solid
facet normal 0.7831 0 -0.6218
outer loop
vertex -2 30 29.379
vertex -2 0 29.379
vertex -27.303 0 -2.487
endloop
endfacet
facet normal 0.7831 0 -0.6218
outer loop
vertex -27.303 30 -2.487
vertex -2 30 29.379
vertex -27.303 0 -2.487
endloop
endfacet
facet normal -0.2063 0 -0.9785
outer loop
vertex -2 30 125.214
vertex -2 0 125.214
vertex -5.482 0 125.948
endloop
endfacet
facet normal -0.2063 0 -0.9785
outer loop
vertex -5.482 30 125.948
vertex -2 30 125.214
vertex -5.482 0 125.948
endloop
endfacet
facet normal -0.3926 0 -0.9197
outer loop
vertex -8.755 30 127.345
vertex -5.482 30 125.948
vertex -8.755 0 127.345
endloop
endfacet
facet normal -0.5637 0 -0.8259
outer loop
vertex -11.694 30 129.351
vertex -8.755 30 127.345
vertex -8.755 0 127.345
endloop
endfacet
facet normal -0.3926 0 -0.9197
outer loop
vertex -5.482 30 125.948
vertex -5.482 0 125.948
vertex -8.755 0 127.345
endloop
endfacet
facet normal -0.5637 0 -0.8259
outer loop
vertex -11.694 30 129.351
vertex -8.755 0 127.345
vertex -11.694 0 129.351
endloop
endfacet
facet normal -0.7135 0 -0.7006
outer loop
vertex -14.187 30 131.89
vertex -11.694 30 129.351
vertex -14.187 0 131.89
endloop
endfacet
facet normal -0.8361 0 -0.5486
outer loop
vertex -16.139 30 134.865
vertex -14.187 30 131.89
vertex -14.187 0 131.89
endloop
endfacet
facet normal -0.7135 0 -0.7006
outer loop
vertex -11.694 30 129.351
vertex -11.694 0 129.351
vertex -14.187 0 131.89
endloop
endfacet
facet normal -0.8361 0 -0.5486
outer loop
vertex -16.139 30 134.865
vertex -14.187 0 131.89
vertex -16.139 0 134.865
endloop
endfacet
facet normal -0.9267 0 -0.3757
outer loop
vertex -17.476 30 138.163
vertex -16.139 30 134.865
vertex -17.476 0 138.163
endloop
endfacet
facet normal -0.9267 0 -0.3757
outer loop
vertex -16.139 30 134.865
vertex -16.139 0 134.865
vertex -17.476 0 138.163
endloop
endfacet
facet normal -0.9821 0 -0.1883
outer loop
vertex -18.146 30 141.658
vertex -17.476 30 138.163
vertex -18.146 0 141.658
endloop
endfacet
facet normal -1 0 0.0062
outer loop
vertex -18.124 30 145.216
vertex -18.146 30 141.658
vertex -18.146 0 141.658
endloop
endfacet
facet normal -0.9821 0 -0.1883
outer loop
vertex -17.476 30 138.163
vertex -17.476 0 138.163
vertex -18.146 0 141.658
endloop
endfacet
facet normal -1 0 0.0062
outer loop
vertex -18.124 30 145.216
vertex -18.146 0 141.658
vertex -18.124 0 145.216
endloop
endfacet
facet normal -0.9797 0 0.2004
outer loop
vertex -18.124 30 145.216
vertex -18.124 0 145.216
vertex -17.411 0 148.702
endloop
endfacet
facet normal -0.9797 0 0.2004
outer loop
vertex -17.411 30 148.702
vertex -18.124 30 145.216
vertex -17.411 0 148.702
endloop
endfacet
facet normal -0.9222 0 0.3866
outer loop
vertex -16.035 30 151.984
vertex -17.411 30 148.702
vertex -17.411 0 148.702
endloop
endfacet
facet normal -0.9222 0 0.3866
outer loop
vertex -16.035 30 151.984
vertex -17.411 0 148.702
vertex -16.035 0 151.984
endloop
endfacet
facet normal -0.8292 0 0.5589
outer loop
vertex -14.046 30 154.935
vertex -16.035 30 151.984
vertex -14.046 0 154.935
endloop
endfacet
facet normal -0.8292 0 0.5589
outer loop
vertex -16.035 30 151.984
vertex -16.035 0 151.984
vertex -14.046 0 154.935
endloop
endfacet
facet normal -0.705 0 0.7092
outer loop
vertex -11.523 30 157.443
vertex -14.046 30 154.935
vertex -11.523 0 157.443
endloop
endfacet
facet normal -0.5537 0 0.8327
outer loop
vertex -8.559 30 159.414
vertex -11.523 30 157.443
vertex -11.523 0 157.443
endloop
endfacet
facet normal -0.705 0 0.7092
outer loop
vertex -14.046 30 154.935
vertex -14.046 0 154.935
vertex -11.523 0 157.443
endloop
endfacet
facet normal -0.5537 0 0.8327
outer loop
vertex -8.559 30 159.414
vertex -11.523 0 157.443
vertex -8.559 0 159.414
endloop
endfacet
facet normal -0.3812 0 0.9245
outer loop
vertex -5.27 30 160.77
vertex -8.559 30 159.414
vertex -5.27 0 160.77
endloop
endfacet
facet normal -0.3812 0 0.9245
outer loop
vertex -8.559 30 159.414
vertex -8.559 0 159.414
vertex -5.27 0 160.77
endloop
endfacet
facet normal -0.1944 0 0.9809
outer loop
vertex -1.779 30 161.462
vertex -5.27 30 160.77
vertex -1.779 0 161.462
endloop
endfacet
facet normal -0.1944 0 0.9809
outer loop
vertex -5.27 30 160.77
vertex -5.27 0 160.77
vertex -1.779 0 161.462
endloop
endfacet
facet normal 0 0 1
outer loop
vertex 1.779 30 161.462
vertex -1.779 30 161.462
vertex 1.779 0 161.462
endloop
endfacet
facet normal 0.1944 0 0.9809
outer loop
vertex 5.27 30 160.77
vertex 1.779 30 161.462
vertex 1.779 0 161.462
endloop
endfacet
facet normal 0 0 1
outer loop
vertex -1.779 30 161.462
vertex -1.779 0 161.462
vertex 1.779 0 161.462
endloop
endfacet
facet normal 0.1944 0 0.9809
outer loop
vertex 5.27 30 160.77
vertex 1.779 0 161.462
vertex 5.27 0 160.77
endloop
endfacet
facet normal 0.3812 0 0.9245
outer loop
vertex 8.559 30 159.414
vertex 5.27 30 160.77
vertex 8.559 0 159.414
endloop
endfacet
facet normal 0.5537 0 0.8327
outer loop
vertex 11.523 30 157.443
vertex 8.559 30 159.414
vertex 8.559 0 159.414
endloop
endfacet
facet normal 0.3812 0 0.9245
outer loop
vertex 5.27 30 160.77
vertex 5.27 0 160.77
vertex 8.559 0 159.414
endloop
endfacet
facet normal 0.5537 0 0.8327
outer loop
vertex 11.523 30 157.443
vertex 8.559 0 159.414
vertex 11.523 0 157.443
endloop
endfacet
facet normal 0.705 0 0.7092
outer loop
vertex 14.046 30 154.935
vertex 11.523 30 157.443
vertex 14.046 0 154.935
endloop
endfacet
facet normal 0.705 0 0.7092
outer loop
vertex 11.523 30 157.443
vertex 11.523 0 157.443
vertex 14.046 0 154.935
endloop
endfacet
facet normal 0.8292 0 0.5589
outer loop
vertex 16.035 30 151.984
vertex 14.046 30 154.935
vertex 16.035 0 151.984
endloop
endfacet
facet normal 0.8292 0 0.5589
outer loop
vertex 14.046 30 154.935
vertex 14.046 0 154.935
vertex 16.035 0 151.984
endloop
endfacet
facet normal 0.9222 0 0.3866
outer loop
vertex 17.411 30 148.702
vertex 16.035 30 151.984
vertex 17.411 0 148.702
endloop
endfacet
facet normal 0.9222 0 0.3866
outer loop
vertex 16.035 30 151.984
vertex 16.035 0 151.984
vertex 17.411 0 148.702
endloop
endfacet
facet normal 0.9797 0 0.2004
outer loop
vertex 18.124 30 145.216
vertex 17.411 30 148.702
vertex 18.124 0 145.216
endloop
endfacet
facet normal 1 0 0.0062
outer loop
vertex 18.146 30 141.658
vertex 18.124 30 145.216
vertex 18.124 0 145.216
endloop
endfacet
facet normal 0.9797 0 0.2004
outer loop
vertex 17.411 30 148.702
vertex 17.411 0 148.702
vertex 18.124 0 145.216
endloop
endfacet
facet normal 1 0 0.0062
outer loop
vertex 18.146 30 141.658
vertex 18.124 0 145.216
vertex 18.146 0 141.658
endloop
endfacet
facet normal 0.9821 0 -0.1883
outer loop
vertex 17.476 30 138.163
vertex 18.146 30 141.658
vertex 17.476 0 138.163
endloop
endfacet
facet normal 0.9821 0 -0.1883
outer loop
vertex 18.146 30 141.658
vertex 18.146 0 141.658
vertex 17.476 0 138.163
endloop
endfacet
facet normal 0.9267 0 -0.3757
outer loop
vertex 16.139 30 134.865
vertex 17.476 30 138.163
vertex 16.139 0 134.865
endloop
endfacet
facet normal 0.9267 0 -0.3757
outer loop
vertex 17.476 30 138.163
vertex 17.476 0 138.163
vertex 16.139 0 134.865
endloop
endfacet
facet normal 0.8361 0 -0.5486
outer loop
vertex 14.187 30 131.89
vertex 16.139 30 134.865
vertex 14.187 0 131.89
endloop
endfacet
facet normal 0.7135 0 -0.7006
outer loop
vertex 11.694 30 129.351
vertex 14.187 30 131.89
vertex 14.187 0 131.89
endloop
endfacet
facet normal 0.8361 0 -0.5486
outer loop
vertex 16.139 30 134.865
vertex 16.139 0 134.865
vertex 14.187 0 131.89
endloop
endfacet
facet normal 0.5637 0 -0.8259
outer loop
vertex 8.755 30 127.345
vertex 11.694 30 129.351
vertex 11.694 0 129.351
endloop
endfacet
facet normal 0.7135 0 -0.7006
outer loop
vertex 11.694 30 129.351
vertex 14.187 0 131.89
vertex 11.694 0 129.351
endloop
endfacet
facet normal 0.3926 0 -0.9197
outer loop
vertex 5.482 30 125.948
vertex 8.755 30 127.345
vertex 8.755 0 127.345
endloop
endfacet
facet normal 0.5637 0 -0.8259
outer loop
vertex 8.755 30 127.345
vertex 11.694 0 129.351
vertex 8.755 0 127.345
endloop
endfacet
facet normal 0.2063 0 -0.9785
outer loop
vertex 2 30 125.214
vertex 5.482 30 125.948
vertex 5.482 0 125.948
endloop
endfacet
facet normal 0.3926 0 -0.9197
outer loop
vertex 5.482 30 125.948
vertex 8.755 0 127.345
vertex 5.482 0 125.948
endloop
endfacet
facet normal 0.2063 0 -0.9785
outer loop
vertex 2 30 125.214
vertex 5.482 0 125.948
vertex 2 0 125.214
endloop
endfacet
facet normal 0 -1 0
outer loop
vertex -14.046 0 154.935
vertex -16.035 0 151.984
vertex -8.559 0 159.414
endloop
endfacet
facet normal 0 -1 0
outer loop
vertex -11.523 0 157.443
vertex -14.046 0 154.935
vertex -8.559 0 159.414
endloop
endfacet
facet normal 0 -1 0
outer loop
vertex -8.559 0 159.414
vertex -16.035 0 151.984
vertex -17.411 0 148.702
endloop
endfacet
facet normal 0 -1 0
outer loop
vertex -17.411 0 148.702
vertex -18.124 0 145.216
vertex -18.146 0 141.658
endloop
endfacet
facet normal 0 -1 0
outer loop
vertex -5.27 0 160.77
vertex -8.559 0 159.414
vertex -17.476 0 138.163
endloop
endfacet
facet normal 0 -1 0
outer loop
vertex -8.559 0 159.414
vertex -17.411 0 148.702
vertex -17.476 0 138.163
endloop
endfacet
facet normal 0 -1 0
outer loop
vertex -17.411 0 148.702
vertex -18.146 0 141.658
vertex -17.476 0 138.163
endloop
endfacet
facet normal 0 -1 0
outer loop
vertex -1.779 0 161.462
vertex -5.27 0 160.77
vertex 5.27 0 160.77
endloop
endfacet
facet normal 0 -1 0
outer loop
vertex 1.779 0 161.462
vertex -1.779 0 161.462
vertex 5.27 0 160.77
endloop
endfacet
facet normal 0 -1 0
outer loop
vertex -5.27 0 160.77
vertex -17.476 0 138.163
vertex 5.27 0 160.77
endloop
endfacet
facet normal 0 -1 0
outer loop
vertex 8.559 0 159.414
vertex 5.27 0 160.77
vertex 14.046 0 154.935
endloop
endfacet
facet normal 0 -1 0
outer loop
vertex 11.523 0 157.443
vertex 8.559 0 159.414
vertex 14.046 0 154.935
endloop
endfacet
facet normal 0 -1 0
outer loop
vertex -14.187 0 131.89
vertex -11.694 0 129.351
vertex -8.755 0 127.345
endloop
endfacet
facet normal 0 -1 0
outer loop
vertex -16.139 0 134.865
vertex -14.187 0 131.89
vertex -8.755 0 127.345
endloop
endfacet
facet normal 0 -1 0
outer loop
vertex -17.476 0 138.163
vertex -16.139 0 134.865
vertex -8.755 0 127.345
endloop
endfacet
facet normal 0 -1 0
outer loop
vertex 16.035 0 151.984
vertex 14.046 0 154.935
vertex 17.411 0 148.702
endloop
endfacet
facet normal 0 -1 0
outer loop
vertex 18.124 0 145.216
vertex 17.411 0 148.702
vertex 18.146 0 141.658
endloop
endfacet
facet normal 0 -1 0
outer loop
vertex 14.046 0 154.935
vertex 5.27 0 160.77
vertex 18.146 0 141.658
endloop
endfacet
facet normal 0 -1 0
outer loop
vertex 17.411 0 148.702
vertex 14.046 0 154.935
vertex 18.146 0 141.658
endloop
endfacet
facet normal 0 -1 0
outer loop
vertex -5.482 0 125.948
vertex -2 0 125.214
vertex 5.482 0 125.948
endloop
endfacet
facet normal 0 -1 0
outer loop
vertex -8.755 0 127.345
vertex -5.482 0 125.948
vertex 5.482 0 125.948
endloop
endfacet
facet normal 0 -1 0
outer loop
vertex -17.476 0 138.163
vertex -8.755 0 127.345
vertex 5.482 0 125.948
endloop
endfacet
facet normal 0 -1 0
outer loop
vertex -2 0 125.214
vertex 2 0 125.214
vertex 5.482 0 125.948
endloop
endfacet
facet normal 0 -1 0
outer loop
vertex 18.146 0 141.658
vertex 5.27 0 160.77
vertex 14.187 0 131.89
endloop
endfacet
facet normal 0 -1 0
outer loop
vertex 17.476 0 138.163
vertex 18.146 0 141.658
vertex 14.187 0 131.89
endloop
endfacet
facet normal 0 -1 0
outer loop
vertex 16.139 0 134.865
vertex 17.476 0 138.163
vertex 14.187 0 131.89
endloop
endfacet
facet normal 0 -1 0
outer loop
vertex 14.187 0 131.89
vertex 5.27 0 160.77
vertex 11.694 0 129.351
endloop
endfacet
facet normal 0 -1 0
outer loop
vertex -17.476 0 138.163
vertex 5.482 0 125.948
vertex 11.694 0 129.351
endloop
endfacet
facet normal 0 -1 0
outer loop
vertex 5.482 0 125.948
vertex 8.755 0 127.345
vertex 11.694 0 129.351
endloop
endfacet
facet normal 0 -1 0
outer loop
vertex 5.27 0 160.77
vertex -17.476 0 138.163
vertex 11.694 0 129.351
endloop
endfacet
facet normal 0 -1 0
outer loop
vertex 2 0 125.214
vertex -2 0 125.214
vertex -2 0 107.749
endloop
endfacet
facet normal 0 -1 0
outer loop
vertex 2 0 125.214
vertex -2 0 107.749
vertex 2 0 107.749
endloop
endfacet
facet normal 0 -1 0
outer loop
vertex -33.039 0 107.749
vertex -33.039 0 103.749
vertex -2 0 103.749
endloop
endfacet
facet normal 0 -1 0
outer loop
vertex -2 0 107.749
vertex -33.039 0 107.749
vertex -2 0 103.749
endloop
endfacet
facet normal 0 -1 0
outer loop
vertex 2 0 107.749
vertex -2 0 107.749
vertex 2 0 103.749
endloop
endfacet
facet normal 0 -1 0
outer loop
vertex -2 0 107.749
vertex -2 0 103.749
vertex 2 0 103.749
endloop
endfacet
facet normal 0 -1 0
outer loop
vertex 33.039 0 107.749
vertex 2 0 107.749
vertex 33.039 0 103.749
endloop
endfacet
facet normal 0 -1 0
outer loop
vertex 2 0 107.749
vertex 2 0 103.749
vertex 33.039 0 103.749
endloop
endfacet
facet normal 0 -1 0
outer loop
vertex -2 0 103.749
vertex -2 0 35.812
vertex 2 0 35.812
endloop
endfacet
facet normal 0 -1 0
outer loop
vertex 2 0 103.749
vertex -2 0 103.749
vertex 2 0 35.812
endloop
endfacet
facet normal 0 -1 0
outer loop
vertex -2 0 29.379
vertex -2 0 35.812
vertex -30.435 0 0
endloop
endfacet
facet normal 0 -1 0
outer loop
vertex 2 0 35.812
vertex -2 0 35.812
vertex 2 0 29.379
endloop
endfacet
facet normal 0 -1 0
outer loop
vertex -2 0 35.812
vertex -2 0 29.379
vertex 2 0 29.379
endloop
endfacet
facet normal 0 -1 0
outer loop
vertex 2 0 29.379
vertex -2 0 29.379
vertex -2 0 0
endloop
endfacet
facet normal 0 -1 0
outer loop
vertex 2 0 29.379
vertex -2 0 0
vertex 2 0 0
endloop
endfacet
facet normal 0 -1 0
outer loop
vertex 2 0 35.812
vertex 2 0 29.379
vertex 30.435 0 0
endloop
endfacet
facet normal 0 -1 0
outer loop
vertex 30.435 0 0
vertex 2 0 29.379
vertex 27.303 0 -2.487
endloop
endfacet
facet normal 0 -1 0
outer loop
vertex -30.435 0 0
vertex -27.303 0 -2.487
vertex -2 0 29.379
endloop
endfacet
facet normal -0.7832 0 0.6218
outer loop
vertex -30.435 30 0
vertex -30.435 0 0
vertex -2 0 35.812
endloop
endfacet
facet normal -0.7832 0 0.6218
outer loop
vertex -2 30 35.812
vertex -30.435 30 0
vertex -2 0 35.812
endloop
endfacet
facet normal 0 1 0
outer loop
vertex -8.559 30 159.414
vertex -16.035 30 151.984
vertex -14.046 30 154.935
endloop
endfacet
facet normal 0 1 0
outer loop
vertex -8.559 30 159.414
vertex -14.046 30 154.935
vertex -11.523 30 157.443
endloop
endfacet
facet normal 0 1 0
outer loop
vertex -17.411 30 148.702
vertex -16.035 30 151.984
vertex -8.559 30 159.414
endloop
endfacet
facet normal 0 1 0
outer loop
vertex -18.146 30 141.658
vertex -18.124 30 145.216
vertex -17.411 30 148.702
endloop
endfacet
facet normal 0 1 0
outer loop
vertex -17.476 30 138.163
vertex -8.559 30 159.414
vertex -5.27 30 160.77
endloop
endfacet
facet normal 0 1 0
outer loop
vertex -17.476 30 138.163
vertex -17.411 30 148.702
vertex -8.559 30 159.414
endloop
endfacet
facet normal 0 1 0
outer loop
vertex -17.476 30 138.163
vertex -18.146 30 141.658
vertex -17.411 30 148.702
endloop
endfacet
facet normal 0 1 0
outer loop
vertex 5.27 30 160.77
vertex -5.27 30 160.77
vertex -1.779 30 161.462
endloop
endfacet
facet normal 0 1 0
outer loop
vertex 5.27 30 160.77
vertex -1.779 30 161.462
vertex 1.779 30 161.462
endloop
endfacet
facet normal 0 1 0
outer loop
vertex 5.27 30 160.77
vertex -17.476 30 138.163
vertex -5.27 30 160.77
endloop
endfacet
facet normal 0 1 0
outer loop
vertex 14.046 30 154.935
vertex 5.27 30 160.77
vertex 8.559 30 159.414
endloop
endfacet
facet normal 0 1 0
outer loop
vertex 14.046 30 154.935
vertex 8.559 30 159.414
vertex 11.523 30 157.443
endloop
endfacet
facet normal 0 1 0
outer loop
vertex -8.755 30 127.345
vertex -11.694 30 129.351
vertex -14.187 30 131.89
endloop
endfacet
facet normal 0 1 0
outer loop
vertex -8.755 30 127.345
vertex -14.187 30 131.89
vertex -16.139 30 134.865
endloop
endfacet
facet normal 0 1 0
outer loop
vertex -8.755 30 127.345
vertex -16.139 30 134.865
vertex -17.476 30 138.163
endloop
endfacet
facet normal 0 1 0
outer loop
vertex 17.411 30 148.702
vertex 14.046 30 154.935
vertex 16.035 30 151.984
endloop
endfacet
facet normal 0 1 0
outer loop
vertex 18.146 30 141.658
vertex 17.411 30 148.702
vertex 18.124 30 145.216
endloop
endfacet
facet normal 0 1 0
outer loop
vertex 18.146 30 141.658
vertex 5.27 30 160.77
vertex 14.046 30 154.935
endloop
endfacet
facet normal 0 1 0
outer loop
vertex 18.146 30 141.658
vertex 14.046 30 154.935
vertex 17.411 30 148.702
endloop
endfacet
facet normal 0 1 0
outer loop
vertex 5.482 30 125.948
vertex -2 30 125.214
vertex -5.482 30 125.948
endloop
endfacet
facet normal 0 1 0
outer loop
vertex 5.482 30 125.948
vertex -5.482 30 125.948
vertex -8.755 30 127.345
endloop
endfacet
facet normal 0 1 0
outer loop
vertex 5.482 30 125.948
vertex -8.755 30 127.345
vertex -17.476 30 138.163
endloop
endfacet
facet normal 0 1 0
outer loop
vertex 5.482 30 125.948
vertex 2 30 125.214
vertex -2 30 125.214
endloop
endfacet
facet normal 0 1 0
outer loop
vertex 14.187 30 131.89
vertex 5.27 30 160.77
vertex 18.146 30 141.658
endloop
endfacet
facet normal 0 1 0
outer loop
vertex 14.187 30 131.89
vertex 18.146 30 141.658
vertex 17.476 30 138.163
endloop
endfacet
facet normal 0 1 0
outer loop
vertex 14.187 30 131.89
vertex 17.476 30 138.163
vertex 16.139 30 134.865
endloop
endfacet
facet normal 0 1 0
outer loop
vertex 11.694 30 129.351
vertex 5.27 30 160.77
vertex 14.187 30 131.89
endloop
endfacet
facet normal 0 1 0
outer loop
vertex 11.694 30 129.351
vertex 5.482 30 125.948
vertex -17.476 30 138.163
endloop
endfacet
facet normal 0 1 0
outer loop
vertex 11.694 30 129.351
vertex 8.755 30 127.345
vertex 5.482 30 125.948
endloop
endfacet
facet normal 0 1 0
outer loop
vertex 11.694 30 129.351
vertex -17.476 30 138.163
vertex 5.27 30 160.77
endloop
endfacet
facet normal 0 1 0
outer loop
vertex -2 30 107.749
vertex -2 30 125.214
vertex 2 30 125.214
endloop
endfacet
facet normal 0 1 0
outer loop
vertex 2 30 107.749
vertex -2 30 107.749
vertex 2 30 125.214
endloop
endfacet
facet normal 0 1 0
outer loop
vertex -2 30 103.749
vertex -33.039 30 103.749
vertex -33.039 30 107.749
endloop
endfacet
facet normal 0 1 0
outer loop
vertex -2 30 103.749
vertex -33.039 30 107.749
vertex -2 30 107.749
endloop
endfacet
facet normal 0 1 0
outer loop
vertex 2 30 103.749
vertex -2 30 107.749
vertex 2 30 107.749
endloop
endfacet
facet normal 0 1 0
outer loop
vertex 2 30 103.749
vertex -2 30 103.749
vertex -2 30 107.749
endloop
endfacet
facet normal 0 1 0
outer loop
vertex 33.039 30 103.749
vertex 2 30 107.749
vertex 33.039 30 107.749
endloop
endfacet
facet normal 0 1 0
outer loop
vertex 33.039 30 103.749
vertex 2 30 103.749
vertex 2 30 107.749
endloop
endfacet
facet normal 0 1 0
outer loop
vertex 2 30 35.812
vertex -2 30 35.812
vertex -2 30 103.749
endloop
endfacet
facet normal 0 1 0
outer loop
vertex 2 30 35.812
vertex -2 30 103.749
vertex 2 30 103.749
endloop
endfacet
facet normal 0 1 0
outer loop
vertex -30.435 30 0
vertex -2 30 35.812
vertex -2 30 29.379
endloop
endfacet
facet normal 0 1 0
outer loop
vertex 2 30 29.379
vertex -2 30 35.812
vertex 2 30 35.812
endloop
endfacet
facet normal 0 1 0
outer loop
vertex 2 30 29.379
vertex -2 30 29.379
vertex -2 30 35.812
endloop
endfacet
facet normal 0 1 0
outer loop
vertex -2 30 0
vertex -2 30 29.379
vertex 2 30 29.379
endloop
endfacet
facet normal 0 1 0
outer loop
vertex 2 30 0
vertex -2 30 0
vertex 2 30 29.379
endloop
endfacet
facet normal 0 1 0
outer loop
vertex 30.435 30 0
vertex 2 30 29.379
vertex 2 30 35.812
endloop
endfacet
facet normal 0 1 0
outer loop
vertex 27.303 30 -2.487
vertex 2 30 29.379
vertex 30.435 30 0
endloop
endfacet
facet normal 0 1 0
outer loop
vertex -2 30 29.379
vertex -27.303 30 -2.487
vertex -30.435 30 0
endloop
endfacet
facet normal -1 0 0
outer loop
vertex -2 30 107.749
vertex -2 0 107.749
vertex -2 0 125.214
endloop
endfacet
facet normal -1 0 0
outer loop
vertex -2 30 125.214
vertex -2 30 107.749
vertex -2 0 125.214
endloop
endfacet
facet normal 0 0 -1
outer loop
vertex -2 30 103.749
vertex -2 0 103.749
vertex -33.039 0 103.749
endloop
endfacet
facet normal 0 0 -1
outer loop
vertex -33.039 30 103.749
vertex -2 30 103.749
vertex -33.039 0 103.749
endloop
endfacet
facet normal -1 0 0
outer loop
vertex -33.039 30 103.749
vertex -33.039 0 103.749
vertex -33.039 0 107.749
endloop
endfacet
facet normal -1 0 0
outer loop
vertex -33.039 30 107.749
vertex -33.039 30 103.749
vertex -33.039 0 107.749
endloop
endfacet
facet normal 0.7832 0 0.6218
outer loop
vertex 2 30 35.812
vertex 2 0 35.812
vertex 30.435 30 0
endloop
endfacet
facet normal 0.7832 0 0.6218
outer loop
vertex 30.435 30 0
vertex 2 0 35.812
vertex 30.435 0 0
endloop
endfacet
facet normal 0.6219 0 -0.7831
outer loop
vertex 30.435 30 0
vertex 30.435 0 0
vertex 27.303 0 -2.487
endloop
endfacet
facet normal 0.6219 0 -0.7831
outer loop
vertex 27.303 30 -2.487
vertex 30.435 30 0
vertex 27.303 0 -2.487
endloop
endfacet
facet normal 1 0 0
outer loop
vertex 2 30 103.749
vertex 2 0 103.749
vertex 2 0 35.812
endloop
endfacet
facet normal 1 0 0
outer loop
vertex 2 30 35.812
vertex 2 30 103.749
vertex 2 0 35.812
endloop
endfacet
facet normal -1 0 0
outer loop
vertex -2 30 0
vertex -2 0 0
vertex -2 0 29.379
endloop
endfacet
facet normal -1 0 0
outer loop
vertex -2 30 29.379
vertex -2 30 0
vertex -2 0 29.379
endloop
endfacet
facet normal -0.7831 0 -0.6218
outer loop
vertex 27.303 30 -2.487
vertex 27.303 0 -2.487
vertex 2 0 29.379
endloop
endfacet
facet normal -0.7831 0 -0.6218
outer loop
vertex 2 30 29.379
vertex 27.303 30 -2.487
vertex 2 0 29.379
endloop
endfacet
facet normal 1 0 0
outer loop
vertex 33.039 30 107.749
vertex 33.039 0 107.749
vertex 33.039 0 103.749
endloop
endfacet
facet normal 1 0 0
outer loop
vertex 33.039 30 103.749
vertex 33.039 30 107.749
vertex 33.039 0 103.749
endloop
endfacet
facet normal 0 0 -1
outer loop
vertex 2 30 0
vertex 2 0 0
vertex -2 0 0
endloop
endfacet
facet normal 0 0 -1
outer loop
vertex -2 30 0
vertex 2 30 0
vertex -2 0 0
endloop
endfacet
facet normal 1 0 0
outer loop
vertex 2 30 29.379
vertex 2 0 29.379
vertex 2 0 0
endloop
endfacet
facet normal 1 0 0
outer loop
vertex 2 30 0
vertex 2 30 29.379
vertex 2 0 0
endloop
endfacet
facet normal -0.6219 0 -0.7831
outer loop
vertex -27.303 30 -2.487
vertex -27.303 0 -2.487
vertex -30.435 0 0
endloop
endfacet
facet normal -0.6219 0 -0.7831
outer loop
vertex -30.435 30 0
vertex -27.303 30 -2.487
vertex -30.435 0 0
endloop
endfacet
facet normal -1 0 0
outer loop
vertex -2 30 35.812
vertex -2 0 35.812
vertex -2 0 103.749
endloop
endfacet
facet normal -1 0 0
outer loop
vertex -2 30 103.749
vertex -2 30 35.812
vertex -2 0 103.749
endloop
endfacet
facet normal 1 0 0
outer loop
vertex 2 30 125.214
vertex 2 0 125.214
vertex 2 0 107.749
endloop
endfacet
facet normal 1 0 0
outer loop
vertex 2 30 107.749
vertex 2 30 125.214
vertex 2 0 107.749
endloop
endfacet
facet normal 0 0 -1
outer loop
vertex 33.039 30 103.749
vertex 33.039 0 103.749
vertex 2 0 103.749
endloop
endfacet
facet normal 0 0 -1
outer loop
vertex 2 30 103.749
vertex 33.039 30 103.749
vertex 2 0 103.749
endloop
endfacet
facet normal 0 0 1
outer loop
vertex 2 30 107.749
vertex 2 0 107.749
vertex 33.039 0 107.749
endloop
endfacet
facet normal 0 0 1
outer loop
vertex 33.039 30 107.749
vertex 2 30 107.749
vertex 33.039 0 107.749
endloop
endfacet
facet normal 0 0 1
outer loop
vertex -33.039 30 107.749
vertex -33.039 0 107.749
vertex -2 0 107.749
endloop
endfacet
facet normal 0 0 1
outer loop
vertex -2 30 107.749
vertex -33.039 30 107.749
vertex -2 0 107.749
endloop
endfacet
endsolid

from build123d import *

# Parameters (mm, degrees)
BOSS_EXTRUDE1_DEPTH = 30


with BuildPart() as part:
    # Sketch1 → Boss-Extrude1 (new body)
    with BuildSketch(Plane(origin=(0, 0, 0), x_dir=(1, 0, 0), z_dir=(0, 1, 0))):
        with BuildLine():
            Line((2, -107.749471884), (33.038610535, -107.749471884))
            Line((33.038610535, -107.749471884), (33.038610535, -103.749471884))
            Line((33.038610535, -103.749471884), (2, -103.749471884))
            Line((2, -103.749471884), (2, -35.811953605))
            Line((2, -35.811953605), (30.435409652, 0))
            Line((30.435409652, 0), (27.302817395, 2.487341101))
            Line((27.302817395, 2.487341101), (2, -29.379381894))
            Line((2, -29.379381894), (2, 0))
            Line((2, 0), (-2, 0))
            Line((-2, 0), (-2, -29.379381894))
            Line((-2, -29.379381894), (-27.302817395, 2.487341101))
            Line((-27.302817395, 2.487341101), (-30.435409652, 0))
            Line((-30.435409652, 0), (-2, -35.811953605))
            Line((-2, -35.811953605), (-2, -103.749471884))
            Line((-2, -103.749471884), (-33.038610535, -103.749471884))
            Line((-33.038610535, -103.749471884), (-33.038610535, -107.749471884))
            Line((-33.038610535, -107.749471884), (-2, -107.749471884))
            Line((-2, -107.749471884), (-2, -125.214231971))
            ThreePointArc((-2, -125.214231971), (0, -161.548956818), (2, -125.214231971))
            Line((2, -125.214231971), (2, -107.749471884))
        make_face()
    extrude(amount=BOSS_EXTRUDE1_DEPTH)


solid = part.part
